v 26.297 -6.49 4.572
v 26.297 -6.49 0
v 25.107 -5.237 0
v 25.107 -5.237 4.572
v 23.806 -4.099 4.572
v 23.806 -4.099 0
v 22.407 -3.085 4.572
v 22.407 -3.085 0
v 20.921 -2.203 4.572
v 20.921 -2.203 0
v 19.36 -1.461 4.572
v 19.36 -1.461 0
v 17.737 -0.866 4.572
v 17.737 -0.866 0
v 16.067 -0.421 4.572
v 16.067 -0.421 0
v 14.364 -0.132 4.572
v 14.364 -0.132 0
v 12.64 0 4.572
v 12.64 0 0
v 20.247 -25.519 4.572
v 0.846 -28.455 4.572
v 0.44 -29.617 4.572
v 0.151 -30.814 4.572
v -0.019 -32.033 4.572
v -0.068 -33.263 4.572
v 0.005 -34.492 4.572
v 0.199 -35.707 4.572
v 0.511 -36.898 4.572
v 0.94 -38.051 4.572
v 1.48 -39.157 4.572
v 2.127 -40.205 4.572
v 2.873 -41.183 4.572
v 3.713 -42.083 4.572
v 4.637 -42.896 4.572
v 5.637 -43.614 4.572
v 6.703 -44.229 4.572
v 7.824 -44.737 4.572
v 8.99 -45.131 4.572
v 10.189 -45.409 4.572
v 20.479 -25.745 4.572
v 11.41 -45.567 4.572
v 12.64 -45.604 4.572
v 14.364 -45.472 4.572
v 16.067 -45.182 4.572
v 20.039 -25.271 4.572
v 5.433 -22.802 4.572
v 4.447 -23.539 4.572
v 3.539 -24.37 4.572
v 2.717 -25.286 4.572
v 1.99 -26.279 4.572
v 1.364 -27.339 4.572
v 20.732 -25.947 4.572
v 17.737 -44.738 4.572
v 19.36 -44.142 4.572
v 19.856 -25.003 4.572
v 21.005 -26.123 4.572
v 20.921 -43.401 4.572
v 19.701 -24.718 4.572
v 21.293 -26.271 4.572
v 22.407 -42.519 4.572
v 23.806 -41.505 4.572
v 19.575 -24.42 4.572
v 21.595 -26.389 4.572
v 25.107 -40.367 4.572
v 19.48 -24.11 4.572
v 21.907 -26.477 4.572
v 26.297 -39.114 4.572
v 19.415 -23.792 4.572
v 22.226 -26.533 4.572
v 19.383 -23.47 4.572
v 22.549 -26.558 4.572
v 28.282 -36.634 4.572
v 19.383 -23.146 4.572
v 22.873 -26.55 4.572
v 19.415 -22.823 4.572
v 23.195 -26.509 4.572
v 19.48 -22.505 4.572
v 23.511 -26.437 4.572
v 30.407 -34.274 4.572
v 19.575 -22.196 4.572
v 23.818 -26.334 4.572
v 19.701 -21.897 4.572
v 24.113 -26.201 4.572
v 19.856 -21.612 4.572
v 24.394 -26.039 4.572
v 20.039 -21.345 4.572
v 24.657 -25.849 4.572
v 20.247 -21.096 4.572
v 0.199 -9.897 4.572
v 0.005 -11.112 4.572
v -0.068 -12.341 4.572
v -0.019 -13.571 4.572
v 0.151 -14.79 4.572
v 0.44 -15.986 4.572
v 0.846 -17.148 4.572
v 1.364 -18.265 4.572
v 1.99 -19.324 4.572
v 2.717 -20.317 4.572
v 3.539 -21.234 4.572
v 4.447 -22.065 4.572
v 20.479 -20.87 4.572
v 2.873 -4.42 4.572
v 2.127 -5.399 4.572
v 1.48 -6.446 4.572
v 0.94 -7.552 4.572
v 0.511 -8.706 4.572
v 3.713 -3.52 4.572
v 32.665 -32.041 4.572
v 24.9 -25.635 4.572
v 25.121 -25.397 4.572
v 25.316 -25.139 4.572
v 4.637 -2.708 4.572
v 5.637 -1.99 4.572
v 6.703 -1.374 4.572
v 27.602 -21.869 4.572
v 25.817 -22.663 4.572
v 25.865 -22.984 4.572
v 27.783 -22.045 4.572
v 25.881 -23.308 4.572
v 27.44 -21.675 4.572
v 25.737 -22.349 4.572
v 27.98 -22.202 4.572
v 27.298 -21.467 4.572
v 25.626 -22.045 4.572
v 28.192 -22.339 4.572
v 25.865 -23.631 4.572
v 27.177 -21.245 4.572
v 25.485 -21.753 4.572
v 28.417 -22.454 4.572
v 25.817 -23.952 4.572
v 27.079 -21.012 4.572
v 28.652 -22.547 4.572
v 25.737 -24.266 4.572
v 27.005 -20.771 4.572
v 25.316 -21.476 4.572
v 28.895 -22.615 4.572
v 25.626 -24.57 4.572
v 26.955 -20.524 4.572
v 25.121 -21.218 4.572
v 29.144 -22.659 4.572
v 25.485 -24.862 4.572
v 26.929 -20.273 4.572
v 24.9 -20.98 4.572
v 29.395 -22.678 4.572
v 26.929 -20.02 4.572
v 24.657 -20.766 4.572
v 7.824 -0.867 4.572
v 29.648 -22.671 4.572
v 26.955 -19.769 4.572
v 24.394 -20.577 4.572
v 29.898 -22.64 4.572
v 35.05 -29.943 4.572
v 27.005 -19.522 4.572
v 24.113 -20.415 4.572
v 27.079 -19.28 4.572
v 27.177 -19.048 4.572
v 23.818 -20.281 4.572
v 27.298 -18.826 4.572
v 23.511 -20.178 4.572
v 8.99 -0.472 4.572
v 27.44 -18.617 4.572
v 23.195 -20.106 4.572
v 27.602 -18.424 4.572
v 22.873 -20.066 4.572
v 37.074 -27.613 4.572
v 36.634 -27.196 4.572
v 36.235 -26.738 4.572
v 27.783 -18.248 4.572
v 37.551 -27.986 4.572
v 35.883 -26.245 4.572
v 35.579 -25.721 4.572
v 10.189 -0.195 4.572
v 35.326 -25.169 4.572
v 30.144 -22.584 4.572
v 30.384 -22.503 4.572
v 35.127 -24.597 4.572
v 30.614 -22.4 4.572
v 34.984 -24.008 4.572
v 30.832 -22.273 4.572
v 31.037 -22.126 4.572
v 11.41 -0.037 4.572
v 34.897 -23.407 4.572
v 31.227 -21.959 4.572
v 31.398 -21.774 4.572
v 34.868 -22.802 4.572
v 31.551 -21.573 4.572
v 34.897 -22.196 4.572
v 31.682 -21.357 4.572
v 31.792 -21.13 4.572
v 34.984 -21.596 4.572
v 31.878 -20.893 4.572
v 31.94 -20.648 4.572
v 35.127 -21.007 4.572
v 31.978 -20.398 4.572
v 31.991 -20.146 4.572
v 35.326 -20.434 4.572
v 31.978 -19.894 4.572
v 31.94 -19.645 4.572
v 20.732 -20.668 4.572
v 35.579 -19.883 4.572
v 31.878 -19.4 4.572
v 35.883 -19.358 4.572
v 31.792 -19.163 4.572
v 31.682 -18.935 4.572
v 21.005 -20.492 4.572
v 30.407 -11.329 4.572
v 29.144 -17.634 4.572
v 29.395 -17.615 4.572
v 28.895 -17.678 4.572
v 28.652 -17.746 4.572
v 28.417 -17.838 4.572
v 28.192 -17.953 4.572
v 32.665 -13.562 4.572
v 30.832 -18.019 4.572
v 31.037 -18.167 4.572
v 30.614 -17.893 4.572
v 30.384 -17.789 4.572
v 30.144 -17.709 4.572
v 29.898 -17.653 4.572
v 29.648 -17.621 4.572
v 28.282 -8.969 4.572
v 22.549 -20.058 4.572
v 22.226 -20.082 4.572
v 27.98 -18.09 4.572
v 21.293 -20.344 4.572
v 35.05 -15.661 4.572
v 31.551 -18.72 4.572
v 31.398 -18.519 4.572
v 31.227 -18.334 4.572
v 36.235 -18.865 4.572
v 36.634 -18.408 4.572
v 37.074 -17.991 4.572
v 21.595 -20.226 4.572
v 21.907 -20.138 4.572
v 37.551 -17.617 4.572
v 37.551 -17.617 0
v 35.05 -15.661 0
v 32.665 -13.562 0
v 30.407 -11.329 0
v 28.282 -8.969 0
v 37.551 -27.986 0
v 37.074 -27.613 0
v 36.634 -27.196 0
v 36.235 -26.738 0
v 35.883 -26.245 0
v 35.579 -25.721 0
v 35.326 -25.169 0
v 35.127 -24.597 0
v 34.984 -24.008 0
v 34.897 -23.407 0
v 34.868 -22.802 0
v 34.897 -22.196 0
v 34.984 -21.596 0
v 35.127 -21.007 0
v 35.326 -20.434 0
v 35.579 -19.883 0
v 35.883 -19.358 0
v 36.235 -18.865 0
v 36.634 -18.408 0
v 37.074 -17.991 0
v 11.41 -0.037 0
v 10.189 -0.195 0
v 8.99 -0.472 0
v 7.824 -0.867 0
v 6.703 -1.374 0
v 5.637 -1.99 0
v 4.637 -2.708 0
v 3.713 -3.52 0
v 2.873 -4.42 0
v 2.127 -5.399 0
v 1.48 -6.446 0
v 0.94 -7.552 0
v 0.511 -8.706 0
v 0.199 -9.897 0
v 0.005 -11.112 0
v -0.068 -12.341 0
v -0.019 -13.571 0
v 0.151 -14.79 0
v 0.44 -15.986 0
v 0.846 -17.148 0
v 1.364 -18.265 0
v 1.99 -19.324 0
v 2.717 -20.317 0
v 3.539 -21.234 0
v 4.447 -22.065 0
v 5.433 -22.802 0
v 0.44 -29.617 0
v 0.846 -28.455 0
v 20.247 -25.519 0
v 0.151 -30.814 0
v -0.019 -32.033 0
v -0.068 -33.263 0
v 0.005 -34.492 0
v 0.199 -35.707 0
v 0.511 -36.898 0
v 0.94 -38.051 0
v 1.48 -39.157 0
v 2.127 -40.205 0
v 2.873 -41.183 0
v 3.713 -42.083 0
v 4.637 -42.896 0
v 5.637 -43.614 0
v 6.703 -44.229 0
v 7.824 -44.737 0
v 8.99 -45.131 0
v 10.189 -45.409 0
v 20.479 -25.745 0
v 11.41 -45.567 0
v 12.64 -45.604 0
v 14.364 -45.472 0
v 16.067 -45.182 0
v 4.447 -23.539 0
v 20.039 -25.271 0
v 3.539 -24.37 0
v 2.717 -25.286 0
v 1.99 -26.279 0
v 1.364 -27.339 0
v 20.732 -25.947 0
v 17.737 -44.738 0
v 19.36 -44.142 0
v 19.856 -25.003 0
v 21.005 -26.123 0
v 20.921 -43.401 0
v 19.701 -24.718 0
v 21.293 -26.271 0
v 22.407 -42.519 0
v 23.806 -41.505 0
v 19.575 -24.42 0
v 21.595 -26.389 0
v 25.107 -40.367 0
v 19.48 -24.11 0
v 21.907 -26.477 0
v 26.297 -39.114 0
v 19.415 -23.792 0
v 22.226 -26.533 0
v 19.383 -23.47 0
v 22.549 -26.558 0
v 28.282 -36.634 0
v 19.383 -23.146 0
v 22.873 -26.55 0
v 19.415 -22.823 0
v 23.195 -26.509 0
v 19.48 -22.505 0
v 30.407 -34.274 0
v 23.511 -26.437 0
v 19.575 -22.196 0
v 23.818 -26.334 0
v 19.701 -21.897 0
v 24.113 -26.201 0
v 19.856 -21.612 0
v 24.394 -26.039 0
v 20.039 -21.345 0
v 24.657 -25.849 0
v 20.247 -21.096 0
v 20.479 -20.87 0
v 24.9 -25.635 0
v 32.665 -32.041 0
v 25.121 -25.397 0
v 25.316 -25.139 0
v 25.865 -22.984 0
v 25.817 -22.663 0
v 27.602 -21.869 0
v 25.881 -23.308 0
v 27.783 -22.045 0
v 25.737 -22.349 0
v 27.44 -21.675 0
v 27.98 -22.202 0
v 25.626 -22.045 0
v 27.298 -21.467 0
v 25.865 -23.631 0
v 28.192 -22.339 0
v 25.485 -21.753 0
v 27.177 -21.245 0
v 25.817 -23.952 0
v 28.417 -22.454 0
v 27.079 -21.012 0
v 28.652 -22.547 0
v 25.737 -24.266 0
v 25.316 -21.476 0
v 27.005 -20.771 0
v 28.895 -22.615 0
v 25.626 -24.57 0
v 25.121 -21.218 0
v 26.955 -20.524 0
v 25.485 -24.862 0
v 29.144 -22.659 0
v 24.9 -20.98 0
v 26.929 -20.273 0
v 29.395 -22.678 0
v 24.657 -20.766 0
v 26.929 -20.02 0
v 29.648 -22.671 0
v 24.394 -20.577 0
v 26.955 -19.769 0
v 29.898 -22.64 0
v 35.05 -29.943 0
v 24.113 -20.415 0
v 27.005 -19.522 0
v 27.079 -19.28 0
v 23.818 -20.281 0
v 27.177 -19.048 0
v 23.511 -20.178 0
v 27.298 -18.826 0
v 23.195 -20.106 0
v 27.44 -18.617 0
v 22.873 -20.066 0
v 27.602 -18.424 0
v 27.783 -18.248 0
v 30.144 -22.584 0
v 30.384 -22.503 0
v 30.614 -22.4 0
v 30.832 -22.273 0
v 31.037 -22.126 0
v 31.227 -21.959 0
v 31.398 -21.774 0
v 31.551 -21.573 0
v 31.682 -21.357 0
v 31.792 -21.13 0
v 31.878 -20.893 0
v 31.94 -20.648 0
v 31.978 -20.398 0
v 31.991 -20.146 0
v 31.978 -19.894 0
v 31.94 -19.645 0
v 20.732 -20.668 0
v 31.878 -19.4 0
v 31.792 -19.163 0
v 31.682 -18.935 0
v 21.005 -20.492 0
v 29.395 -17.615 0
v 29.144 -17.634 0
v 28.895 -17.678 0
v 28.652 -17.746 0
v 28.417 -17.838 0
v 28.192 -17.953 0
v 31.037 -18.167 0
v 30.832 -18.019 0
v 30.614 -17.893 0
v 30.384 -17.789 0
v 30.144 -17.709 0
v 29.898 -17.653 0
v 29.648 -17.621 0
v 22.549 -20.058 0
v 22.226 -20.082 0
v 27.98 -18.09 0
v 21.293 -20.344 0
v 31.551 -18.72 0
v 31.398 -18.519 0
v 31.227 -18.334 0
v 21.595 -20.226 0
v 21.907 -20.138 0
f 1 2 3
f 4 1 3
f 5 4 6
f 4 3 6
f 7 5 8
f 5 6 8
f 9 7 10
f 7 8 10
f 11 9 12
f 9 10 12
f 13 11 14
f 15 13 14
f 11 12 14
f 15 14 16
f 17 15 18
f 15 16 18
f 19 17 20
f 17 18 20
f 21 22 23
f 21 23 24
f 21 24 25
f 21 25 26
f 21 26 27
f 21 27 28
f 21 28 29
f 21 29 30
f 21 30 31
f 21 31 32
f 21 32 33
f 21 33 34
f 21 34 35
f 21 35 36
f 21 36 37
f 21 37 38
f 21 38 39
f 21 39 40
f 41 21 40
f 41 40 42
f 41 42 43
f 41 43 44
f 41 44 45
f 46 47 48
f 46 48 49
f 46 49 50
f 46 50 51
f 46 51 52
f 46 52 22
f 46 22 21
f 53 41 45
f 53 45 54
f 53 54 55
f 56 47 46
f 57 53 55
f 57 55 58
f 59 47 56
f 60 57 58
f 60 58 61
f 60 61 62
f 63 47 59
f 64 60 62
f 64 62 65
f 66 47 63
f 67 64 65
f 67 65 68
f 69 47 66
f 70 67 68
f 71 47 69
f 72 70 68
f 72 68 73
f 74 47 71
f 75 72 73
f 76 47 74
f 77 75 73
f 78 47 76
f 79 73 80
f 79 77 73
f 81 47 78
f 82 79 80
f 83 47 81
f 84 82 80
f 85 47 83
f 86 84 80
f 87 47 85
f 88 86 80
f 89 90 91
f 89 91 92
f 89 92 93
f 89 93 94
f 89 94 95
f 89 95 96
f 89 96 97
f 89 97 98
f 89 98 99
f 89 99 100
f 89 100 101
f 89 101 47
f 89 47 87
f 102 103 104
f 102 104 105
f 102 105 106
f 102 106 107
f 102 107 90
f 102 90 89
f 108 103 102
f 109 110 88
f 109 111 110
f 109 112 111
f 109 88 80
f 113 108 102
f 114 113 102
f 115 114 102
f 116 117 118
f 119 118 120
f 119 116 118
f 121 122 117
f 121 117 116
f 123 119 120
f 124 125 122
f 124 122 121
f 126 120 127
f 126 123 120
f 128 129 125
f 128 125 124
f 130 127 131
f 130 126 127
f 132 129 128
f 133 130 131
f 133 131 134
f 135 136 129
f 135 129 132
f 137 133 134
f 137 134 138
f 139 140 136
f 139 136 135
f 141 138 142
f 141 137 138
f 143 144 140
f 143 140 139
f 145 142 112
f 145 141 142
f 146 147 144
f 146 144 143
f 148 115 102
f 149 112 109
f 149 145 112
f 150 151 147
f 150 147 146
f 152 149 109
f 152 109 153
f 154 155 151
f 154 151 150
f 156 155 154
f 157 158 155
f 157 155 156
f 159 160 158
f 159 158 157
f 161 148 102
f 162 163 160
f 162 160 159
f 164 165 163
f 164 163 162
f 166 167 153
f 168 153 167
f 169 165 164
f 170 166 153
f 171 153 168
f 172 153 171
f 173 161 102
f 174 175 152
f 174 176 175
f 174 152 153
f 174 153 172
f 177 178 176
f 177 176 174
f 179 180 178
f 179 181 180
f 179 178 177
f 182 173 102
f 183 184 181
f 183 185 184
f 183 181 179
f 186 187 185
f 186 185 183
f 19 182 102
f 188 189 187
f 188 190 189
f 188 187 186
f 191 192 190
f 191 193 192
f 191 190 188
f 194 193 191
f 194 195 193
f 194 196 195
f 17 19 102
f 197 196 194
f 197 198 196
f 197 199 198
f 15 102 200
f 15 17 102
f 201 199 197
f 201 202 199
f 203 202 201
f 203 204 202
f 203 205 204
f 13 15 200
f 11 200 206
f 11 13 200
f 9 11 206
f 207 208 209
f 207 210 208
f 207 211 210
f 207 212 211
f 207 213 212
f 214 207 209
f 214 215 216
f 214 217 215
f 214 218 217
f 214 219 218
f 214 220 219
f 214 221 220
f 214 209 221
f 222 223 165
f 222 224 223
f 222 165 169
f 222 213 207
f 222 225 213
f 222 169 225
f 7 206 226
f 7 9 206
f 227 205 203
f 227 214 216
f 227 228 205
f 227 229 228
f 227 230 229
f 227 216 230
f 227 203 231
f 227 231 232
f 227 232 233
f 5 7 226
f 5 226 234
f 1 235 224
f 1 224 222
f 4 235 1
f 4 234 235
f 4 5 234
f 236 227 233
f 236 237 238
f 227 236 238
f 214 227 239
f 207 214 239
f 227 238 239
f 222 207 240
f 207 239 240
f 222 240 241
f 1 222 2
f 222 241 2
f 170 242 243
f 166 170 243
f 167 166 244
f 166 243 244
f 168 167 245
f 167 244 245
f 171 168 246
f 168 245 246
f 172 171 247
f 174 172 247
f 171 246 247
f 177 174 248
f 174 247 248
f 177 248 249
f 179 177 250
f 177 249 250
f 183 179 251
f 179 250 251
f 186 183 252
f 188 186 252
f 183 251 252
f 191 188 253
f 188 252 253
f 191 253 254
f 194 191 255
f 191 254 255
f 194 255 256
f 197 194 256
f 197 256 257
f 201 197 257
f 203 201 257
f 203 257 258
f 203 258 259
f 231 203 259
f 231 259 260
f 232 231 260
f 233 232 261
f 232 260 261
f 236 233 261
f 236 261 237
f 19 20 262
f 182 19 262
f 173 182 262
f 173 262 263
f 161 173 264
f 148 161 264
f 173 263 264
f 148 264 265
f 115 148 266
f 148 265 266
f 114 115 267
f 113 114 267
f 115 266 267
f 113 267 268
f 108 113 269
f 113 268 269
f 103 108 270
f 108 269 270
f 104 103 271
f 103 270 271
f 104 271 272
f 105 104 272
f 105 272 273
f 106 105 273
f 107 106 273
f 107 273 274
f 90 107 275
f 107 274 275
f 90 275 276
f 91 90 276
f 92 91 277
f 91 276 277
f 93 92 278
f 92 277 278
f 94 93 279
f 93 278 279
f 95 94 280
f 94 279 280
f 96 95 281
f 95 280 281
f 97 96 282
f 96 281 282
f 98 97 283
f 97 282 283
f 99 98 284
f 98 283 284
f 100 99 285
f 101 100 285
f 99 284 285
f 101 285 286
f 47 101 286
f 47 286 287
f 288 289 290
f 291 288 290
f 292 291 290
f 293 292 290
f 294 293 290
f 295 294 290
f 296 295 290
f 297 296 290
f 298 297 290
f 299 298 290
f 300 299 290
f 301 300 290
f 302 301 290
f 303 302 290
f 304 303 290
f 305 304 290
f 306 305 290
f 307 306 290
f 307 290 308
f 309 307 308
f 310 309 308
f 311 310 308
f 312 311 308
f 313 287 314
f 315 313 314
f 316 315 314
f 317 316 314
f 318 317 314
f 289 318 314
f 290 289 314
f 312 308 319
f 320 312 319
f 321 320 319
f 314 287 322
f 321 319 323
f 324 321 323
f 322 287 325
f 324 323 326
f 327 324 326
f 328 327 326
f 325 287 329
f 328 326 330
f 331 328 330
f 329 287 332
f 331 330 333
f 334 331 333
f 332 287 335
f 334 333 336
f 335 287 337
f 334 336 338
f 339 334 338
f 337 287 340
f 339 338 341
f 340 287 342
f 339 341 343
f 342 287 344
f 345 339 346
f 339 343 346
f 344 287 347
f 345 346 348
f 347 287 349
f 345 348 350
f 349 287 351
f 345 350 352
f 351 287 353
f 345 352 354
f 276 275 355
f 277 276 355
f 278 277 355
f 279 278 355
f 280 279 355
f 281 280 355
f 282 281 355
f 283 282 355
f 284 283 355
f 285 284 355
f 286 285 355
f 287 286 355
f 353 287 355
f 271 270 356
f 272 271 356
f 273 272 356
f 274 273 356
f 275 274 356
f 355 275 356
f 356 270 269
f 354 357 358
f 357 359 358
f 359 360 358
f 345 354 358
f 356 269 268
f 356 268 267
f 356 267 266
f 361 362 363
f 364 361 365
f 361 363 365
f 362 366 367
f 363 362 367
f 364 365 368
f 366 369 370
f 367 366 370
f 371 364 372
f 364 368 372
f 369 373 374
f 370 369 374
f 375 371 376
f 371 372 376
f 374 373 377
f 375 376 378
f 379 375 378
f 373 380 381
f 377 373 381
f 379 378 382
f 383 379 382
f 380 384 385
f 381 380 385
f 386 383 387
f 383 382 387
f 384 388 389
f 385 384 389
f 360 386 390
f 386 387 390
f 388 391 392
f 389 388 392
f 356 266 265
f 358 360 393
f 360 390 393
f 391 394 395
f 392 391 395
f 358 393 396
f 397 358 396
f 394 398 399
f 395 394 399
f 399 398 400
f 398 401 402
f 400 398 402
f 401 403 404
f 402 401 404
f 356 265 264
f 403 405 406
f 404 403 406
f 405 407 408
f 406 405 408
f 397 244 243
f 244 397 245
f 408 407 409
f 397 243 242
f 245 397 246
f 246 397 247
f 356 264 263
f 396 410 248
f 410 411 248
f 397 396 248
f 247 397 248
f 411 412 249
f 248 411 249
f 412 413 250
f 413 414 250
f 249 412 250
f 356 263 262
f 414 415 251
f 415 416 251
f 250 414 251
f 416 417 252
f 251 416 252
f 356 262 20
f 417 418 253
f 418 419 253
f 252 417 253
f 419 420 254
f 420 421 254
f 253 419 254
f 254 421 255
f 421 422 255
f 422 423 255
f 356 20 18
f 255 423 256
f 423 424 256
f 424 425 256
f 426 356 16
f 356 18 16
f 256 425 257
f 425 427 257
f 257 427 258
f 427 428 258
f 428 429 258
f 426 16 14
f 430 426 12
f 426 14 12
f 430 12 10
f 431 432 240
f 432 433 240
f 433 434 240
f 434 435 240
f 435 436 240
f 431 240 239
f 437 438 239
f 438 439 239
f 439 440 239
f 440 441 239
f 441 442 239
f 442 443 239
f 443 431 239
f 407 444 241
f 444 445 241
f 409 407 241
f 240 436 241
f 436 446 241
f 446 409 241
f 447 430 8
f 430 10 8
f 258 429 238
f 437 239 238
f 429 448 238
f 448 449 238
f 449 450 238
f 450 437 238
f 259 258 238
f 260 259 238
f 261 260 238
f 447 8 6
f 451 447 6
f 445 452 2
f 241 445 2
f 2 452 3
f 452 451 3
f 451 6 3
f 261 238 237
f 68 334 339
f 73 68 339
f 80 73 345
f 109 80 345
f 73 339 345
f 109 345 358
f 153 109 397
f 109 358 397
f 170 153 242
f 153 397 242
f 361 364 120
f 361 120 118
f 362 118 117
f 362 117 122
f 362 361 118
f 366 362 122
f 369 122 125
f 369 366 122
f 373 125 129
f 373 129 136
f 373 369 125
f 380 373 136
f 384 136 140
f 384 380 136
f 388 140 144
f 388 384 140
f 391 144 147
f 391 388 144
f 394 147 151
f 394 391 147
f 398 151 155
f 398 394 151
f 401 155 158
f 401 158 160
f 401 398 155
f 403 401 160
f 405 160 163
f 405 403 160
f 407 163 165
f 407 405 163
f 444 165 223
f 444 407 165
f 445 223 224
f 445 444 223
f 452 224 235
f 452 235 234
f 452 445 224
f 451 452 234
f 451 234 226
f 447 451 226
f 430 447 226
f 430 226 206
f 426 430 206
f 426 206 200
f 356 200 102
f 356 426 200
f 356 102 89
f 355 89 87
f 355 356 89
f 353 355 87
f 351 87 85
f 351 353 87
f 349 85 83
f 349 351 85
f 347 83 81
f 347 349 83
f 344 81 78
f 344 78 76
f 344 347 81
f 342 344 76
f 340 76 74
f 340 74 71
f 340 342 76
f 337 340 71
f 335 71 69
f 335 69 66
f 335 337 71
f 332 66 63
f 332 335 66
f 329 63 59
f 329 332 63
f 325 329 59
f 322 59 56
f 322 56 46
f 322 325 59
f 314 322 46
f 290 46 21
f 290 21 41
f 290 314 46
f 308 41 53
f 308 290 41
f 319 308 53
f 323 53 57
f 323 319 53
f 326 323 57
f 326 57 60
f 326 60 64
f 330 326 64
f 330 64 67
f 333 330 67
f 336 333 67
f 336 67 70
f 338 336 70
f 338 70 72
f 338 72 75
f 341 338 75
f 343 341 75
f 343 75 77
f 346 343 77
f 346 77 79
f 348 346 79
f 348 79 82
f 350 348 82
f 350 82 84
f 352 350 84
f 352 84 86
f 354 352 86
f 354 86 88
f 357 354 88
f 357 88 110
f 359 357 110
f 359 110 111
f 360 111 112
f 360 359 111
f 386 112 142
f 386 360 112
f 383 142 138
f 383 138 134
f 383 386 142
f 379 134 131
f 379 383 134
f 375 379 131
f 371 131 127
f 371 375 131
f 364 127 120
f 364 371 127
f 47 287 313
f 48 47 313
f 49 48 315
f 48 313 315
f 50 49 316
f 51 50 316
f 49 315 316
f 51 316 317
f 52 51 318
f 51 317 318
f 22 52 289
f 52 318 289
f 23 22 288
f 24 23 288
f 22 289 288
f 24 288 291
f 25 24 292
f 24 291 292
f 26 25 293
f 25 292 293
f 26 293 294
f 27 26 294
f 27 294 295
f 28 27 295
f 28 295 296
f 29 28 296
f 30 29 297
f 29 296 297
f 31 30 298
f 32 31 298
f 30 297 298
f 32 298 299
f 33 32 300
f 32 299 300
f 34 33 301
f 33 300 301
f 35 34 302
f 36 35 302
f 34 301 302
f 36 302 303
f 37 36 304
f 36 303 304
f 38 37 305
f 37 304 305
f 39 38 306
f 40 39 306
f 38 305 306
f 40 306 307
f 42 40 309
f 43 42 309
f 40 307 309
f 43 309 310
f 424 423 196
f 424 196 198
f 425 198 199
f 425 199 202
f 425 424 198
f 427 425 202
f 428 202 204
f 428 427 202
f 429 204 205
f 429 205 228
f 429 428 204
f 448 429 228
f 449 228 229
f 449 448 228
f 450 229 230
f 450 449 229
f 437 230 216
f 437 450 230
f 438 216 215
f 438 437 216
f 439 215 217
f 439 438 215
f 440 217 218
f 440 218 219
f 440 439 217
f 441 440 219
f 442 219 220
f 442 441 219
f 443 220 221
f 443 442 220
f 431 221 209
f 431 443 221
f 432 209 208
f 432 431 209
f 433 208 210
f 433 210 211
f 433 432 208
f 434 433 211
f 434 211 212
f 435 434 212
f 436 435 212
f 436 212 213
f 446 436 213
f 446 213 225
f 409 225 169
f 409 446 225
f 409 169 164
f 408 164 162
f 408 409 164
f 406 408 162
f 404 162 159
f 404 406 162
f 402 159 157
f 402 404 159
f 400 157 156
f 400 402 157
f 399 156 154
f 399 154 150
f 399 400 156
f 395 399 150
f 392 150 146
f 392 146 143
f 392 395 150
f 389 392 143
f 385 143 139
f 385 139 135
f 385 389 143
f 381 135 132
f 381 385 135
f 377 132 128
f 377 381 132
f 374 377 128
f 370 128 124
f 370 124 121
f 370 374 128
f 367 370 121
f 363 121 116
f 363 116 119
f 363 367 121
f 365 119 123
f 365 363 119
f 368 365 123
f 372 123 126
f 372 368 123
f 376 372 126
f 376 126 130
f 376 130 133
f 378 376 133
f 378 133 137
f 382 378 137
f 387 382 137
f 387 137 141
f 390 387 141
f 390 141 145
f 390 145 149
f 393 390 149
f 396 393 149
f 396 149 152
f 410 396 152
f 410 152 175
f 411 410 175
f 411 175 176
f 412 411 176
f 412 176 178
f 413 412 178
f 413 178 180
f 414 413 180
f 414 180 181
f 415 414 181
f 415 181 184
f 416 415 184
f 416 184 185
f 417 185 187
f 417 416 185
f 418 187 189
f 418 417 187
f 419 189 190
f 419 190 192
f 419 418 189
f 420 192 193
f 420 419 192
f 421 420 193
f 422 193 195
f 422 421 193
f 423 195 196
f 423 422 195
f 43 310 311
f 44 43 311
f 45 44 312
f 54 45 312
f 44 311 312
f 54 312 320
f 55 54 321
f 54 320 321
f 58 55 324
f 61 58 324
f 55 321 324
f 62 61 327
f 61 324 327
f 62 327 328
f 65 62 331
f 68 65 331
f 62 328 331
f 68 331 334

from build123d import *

# Parameters (mm, degrees)
F0_R     = 3.251044
F0_R_2   = 2.532183
F1_DEPTH = 4.572


with BuildPart() as f1:
    # F0 (on Top) → F1 (new body)
    with BuildSketch(Plane.XY):
        with BuildLine():
            ThreePointArc((26.297173, -6.489626), (20.14867, -1.814141), (12.640465, 0))
            ThreePointArc((12.640465, 0), (0.511468, -8.706083), (5.432757, -22.801805))
            ThreePointArc((5.432757, -22.801805), (0.511468, -36.897527), (12.640465, -45.603611))
            ThreePointArc((12.640465, -45.603611), (20.14867, -43.78947), (26.297173, -39.113984))
            ThreePointArc((26.297173, -39.113984), (31.520039, -33.141343), (37.551314, -27.986296))
            ThreePointArc((37.551314, -27.986296), (34.86808, -22.801805), (37.551314, -17.617315))
            ThreePointArc((37.551314, -17.617315), (31.520039, -12.462268), (26.297173, -6.489626))
        make_face()
        with Locations((22.630094, -23.30761)):
            Circle(F0_R, mode=Mode.SUBTRACT)
        with Locations((29.45845, -20.146335)):
            Circle(F0_R_2, mode=Mode.SUBTRACT)
    extrude(amount=F1_DEPTH)


solid = f1.part
